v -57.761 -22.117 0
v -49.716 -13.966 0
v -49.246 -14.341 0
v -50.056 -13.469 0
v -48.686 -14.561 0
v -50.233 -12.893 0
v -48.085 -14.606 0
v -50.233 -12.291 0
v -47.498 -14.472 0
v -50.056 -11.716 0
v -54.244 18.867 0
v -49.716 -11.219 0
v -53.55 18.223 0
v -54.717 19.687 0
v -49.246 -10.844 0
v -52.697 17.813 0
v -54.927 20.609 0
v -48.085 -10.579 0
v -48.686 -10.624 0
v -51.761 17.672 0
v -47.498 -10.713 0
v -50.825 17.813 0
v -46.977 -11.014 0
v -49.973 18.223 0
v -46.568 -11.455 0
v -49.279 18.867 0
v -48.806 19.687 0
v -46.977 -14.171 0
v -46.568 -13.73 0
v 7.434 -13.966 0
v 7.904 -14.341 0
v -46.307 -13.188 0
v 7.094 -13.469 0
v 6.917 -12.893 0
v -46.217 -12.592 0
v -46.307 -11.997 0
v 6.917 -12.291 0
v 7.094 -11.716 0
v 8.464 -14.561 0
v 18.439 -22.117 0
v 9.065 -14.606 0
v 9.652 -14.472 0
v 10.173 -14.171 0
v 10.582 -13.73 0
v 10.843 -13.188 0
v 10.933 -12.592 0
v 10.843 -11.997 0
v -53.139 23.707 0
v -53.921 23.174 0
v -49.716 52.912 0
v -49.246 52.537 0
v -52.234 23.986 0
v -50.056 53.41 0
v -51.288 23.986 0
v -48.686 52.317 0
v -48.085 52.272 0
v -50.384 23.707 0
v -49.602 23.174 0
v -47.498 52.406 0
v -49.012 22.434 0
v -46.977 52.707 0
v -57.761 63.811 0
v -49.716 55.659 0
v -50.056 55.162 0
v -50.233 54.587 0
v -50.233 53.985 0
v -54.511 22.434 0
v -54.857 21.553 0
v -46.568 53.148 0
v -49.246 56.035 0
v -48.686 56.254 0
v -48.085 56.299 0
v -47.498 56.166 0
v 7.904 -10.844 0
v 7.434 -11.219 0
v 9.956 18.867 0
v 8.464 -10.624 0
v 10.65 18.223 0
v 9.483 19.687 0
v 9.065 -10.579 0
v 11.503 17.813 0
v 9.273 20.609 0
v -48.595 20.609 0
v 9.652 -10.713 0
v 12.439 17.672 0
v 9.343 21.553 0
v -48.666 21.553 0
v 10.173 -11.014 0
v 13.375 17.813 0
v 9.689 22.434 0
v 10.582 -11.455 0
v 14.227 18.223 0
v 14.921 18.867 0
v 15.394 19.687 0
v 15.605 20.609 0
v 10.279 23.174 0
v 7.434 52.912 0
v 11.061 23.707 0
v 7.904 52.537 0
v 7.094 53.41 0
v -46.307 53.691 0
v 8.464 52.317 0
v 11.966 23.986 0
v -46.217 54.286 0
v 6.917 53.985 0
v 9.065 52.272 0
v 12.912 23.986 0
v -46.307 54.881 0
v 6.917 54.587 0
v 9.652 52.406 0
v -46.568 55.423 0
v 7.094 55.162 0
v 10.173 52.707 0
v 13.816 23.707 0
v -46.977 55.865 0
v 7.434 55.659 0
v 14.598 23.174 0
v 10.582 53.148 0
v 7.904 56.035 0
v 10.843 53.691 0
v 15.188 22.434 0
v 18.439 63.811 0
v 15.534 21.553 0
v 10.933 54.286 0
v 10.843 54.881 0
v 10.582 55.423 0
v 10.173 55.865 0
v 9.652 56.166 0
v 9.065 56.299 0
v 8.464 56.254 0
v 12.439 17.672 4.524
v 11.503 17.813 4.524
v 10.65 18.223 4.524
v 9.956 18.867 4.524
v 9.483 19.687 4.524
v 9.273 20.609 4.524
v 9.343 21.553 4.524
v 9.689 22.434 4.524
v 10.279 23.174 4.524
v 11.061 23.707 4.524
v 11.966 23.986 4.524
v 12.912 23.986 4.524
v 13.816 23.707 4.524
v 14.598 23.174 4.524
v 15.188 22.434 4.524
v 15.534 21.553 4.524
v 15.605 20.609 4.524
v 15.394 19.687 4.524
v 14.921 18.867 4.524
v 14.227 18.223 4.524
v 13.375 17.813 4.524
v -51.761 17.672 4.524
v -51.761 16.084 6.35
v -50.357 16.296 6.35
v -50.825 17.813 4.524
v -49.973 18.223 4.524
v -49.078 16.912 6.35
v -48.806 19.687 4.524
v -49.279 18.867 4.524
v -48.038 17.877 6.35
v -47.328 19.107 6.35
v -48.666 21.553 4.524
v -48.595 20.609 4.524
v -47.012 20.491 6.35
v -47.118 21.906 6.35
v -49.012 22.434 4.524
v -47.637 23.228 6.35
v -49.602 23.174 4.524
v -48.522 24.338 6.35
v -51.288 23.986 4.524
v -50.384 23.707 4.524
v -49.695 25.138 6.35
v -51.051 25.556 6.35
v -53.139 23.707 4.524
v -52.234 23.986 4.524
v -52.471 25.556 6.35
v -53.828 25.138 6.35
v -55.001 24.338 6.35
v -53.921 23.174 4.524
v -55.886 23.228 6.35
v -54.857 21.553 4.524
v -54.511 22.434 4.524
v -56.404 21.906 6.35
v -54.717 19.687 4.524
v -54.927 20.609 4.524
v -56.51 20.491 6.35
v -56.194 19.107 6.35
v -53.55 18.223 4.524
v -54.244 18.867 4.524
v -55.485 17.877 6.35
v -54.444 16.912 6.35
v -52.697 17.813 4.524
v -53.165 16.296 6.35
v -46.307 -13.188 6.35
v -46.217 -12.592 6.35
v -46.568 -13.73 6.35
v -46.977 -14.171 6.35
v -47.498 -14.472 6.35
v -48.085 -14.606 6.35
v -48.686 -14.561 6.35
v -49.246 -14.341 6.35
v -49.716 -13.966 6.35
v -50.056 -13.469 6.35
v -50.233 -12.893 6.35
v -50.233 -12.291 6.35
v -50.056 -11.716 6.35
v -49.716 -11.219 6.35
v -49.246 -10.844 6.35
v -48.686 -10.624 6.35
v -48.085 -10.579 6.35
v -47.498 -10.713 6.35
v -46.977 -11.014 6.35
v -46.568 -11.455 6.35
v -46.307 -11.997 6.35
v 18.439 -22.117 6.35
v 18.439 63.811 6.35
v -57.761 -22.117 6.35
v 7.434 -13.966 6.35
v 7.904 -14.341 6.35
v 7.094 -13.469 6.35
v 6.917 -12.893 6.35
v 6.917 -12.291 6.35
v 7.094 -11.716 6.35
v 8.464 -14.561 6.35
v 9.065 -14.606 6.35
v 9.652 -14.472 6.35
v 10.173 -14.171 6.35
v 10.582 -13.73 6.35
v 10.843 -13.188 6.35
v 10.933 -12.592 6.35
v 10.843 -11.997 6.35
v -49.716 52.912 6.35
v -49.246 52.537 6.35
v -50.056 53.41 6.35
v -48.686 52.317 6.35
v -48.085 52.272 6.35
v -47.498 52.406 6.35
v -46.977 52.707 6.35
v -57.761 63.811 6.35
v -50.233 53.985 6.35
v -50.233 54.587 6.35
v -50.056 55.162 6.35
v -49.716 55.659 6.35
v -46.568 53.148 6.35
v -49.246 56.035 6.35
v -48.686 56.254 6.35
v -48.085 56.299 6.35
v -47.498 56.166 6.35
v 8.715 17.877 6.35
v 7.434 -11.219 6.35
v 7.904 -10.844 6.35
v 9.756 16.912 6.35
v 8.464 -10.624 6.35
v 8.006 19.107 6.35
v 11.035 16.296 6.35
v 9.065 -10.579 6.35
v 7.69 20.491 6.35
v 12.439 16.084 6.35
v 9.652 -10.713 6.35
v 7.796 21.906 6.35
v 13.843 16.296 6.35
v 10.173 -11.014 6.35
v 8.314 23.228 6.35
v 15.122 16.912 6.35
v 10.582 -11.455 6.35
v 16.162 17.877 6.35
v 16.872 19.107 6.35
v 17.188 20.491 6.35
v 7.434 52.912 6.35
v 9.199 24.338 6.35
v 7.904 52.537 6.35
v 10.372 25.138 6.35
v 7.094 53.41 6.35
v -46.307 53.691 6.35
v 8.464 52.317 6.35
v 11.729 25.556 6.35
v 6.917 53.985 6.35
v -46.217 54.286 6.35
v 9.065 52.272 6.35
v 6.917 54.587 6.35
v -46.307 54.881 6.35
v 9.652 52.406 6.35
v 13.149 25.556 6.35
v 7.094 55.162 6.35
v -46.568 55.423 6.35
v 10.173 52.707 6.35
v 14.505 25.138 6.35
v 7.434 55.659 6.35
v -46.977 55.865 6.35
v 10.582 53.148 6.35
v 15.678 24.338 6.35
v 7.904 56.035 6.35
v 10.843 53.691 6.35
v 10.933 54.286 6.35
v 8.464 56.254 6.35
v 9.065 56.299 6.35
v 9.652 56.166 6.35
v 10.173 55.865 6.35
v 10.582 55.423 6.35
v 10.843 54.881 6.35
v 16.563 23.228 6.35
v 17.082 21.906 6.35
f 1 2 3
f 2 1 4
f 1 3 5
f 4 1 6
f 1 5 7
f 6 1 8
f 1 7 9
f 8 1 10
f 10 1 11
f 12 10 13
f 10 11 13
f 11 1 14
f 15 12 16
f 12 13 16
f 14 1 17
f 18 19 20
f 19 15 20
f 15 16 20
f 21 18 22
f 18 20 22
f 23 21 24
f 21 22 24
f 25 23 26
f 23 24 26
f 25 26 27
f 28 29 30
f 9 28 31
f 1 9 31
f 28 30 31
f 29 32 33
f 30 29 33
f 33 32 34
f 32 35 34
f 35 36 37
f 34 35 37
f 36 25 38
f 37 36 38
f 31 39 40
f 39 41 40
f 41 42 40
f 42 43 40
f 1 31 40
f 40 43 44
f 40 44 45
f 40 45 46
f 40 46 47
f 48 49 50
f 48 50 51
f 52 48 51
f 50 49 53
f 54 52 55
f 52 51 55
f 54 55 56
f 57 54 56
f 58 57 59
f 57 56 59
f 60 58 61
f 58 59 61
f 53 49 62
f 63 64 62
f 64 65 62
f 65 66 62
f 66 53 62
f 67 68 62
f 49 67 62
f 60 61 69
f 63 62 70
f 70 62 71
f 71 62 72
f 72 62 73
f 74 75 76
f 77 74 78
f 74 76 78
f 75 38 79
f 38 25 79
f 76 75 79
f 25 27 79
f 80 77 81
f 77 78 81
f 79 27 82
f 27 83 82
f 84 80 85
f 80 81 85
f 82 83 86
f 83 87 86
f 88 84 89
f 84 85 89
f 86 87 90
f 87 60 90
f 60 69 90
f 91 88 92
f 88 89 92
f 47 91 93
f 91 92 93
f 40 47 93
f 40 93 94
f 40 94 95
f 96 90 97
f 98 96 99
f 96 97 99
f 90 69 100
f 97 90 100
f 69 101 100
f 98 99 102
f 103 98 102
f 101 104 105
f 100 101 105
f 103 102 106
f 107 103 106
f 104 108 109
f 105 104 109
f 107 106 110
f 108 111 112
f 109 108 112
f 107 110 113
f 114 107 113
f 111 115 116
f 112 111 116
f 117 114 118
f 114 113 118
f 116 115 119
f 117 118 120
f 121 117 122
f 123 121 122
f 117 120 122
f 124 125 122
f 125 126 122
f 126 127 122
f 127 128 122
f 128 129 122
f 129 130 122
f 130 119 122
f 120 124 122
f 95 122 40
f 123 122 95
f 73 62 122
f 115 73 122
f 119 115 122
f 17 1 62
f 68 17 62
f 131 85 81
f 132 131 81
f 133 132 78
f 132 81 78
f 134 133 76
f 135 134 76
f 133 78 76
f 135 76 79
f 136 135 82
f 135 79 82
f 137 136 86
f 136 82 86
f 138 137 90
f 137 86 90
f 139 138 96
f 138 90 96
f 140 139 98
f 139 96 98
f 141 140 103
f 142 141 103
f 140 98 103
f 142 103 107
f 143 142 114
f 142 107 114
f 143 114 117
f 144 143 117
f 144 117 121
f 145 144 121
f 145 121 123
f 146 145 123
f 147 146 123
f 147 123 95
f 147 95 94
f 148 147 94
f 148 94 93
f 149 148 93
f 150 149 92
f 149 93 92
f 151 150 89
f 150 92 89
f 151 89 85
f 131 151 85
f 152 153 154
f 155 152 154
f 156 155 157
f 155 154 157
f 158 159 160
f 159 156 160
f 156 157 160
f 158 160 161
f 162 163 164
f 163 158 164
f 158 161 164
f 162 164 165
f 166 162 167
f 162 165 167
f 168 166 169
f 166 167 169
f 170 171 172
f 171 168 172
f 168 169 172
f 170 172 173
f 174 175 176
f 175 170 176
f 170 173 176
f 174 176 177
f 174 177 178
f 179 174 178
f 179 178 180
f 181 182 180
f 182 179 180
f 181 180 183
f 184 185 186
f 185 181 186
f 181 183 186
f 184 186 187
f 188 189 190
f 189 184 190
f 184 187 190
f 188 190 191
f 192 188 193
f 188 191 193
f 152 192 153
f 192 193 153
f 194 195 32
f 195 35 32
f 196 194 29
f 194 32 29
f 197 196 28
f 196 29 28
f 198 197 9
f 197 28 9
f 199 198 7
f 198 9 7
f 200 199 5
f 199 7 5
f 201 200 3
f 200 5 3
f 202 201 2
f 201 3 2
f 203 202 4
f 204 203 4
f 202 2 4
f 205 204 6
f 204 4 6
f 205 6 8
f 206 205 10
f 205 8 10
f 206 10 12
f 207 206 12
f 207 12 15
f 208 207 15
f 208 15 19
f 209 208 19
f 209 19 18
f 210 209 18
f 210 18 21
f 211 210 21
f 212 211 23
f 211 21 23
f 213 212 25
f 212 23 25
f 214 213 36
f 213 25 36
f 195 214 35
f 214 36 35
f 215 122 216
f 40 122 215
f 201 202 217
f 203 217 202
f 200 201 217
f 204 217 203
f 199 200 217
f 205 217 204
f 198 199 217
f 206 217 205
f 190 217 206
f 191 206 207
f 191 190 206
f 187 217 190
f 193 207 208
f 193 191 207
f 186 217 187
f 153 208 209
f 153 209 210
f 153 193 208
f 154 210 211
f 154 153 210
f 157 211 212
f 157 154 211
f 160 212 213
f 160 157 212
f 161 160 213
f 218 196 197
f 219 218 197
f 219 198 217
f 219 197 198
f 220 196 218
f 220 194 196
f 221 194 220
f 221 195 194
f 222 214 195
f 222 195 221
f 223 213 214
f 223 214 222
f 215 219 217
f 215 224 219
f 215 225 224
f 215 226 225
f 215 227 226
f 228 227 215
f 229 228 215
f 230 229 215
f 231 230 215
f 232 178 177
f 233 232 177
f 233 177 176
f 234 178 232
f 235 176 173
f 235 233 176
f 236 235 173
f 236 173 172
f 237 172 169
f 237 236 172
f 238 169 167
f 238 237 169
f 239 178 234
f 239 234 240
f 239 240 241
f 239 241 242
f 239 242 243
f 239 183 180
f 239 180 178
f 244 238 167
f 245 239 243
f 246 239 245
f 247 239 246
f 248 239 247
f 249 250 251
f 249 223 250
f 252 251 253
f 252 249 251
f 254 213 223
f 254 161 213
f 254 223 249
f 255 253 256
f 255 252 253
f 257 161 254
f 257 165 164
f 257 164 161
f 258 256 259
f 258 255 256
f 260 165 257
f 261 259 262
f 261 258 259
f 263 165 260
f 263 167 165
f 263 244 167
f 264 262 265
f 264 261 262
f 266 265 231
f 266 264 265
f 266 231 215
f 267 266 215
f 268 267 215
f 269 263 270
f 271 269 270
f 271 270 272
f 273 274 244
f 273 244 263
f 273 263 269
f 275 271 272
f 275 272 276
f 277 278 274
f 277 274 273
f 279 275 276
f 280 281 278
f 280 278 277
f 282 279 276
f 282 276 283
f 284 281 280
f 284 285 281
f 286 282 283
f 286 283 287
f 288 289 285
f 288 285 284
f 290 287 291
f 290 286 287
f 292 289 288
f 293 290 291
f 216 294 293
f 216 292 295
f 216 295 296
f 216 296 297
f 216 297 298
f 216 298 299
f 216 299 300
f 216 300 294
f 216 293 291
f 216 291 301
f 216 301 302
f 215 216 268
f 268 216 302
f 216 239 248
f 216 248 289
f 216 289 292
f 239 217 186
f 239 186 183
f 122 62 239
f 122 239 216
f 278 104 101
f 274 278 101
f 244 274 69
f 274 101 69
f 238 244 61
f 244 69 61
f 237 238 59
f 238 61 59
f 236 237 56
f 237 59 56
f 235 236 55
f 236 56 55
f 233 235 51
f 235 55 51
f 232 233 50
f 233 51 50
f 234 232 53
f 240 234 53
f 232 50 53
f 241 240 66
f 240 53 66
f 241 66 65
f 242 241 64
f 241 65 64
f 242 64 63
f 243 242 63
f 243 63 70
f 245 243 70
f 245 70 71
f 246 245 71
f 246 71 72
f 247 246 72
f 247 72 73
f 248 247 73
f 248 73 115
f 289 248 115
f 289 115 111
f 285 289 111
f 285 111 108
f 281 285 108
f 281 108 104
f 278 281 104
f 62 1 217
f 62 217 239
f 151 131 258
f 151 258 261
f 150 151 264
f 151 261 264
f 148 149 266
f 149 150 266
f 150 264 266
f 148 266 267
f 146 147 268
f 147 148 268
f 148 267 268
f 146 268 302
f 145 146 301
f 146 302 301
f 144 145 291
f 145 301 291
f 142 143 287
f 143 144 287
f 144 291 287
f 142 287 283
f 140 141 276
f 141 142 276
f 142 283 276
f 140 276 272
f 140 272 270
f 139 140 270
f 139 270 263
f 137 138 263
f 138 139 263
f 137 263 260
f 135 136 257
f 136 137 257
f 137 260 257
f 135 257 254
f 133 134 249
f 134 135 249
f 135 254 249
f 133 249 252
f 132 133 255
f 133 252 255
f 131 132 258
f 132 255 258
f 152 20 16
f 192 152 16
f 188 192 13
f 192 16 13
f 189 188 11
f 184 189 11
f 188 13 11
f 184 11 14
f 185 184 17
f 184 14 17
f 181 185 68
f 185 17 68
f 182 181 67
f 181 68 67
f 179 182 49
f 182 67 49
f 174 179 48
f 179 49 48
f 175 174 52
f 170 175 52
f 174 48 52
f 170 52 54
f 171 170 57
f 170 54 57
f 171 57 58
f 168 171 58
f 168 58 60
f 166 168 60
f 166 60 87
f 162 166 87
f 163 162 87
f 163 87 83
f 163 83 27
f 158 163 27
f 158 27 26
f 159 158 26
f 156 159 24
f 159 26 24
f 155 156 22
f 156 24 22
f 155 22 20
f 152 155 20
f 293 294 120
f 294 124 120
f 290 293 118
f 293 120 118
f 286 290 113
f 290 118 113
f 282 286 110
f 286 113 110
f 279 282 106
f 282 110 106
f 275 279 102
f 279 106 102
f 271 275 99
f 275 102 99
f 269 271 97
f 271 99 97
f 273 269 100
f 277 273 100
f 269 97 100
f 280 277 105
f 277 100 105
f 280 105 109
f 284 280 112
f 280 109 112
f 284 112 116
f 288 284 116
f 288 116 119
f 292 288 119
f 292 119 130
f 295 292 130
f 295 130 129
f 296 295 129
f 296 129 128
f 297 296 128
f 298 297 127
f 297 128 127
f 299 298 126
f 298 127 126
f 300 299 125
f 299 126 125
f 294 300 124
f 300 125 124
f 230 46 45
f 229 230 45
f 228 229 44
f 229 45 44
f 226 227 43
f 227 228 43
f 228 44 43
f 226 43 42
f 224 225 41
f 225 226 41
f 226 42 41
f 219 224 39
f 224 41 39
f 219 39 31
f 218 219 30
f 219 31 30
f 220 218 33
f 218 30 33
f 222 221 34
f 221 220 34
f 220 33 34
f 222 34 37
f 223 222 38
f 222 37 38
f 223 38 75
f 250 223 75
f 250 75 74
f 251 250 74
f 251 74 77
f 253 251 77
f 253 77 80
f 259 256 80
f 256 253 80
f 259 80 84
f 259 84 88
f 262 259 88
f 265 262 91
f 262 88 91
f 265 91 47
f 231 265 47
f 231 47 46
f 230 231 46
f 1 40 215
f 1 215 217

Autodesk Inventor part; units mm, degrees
ref_plane "YZ Plane" through (0, 0, 0) normal (1, 0, 0) x (0, 1, 0)
ref_plane "XZ Plane" through (0, 0, 0) normal (0, 1, 0) x (-1, 0, 0)
ref_plane "XY Plane" through (0, 0, 0) normal (0, 0, 1) x (1, 0, 0)
sketch "Sketch1" plane through (0, 0, 0) normal (0, 0, 1) x (1, 0, 0)
  line L0 (-57.7612, 63.8108) -> (18.4388, 63.8108)
  line L1 (18.4388, 63.8108) -> (18.4388, -22.1174)
  line L2 (18.4388, -22.1174) -> (-57.7612, -22.1174)
  line L3 (-57.7612, -22.1174) -> (-57.7612, 63.8108)
  line L4 (-57.7612, 63.8108) -> (-48.2362, 63.8108)
  line L5 (-48.2362, 63.8108) -> (-48.2362, 54.2858)
  line L6 (18.4388, 63.8108) -> (8.9138, 63.8108)
  line L7 (8.9138, 63.8108) -> (8.9138, 54.2858)
  line L8 (-57.7612, -22.1174) -> (-57.7612, -12.5924)
  line L9 (-57.7612, -12.5924) -> (-48.2362, -12.5924)
  circle A0 centre (-48.2362, 54.2858) radius 2.0193
  circle A1 centre (8.9138, 54.2858) radius 2.0193
  circle A2 centre (-48.2362, -12.5924) radius 2.0193
  circle A3 centre (8.9138, -12.5924) radius 2.0193
  circle A4 centre (-51.7612, 20.8467) radius 3.048
  circle A5 centre (12.4388, 20.8467) radius 3.048
  point P0 (0, 0)
  dimension "d0" = 76.2
  dimension "d1" = 85.9282
  dimension "d2" = 9.525
  dimension "d3" = 9.525
  dimension "d4" = 9.525
  dimension "d5" = 9.525
  dimension "d6" = 9.525
  dimension "d7" = 9.525
  dimension "d8" = 4.0386
  dimension "d9" = 4.0386
  dimension "d10" = 4.0386
  dimension "d11" = 4.0386
  dimension "d15" = 6.096
  dimension "d16" = 6.096
extrude "Extrusion1" add sketch "Sketch1" along normal blind 6.35
sketch "Sketch2" plane through (0, 0, 6.35) normal (0, 0, 1) x (1, 0, 0)
  circle A0 centre (12.4388, 20.8467) radius 3.048 projected
  circle A1 centre (-51.7612, 20.8467) radius 3.048 projected
  circle A2 centre (-51.7612, 20.8467) radius 3.048
  circle A3 centre (12.4388, 20.8467) radius 3.048
  point P0 (0, 0)
hole "Hole1" at (-51.7612, 20.8467, 6.35) at (12.4388, 20.8467, 6.35) direction (0, 0, -1) diameter 6.35 depth 25.4 tip angle 118 countersink diameter 9.525 countersink angle 82
properties part number "glass socket bottom"
